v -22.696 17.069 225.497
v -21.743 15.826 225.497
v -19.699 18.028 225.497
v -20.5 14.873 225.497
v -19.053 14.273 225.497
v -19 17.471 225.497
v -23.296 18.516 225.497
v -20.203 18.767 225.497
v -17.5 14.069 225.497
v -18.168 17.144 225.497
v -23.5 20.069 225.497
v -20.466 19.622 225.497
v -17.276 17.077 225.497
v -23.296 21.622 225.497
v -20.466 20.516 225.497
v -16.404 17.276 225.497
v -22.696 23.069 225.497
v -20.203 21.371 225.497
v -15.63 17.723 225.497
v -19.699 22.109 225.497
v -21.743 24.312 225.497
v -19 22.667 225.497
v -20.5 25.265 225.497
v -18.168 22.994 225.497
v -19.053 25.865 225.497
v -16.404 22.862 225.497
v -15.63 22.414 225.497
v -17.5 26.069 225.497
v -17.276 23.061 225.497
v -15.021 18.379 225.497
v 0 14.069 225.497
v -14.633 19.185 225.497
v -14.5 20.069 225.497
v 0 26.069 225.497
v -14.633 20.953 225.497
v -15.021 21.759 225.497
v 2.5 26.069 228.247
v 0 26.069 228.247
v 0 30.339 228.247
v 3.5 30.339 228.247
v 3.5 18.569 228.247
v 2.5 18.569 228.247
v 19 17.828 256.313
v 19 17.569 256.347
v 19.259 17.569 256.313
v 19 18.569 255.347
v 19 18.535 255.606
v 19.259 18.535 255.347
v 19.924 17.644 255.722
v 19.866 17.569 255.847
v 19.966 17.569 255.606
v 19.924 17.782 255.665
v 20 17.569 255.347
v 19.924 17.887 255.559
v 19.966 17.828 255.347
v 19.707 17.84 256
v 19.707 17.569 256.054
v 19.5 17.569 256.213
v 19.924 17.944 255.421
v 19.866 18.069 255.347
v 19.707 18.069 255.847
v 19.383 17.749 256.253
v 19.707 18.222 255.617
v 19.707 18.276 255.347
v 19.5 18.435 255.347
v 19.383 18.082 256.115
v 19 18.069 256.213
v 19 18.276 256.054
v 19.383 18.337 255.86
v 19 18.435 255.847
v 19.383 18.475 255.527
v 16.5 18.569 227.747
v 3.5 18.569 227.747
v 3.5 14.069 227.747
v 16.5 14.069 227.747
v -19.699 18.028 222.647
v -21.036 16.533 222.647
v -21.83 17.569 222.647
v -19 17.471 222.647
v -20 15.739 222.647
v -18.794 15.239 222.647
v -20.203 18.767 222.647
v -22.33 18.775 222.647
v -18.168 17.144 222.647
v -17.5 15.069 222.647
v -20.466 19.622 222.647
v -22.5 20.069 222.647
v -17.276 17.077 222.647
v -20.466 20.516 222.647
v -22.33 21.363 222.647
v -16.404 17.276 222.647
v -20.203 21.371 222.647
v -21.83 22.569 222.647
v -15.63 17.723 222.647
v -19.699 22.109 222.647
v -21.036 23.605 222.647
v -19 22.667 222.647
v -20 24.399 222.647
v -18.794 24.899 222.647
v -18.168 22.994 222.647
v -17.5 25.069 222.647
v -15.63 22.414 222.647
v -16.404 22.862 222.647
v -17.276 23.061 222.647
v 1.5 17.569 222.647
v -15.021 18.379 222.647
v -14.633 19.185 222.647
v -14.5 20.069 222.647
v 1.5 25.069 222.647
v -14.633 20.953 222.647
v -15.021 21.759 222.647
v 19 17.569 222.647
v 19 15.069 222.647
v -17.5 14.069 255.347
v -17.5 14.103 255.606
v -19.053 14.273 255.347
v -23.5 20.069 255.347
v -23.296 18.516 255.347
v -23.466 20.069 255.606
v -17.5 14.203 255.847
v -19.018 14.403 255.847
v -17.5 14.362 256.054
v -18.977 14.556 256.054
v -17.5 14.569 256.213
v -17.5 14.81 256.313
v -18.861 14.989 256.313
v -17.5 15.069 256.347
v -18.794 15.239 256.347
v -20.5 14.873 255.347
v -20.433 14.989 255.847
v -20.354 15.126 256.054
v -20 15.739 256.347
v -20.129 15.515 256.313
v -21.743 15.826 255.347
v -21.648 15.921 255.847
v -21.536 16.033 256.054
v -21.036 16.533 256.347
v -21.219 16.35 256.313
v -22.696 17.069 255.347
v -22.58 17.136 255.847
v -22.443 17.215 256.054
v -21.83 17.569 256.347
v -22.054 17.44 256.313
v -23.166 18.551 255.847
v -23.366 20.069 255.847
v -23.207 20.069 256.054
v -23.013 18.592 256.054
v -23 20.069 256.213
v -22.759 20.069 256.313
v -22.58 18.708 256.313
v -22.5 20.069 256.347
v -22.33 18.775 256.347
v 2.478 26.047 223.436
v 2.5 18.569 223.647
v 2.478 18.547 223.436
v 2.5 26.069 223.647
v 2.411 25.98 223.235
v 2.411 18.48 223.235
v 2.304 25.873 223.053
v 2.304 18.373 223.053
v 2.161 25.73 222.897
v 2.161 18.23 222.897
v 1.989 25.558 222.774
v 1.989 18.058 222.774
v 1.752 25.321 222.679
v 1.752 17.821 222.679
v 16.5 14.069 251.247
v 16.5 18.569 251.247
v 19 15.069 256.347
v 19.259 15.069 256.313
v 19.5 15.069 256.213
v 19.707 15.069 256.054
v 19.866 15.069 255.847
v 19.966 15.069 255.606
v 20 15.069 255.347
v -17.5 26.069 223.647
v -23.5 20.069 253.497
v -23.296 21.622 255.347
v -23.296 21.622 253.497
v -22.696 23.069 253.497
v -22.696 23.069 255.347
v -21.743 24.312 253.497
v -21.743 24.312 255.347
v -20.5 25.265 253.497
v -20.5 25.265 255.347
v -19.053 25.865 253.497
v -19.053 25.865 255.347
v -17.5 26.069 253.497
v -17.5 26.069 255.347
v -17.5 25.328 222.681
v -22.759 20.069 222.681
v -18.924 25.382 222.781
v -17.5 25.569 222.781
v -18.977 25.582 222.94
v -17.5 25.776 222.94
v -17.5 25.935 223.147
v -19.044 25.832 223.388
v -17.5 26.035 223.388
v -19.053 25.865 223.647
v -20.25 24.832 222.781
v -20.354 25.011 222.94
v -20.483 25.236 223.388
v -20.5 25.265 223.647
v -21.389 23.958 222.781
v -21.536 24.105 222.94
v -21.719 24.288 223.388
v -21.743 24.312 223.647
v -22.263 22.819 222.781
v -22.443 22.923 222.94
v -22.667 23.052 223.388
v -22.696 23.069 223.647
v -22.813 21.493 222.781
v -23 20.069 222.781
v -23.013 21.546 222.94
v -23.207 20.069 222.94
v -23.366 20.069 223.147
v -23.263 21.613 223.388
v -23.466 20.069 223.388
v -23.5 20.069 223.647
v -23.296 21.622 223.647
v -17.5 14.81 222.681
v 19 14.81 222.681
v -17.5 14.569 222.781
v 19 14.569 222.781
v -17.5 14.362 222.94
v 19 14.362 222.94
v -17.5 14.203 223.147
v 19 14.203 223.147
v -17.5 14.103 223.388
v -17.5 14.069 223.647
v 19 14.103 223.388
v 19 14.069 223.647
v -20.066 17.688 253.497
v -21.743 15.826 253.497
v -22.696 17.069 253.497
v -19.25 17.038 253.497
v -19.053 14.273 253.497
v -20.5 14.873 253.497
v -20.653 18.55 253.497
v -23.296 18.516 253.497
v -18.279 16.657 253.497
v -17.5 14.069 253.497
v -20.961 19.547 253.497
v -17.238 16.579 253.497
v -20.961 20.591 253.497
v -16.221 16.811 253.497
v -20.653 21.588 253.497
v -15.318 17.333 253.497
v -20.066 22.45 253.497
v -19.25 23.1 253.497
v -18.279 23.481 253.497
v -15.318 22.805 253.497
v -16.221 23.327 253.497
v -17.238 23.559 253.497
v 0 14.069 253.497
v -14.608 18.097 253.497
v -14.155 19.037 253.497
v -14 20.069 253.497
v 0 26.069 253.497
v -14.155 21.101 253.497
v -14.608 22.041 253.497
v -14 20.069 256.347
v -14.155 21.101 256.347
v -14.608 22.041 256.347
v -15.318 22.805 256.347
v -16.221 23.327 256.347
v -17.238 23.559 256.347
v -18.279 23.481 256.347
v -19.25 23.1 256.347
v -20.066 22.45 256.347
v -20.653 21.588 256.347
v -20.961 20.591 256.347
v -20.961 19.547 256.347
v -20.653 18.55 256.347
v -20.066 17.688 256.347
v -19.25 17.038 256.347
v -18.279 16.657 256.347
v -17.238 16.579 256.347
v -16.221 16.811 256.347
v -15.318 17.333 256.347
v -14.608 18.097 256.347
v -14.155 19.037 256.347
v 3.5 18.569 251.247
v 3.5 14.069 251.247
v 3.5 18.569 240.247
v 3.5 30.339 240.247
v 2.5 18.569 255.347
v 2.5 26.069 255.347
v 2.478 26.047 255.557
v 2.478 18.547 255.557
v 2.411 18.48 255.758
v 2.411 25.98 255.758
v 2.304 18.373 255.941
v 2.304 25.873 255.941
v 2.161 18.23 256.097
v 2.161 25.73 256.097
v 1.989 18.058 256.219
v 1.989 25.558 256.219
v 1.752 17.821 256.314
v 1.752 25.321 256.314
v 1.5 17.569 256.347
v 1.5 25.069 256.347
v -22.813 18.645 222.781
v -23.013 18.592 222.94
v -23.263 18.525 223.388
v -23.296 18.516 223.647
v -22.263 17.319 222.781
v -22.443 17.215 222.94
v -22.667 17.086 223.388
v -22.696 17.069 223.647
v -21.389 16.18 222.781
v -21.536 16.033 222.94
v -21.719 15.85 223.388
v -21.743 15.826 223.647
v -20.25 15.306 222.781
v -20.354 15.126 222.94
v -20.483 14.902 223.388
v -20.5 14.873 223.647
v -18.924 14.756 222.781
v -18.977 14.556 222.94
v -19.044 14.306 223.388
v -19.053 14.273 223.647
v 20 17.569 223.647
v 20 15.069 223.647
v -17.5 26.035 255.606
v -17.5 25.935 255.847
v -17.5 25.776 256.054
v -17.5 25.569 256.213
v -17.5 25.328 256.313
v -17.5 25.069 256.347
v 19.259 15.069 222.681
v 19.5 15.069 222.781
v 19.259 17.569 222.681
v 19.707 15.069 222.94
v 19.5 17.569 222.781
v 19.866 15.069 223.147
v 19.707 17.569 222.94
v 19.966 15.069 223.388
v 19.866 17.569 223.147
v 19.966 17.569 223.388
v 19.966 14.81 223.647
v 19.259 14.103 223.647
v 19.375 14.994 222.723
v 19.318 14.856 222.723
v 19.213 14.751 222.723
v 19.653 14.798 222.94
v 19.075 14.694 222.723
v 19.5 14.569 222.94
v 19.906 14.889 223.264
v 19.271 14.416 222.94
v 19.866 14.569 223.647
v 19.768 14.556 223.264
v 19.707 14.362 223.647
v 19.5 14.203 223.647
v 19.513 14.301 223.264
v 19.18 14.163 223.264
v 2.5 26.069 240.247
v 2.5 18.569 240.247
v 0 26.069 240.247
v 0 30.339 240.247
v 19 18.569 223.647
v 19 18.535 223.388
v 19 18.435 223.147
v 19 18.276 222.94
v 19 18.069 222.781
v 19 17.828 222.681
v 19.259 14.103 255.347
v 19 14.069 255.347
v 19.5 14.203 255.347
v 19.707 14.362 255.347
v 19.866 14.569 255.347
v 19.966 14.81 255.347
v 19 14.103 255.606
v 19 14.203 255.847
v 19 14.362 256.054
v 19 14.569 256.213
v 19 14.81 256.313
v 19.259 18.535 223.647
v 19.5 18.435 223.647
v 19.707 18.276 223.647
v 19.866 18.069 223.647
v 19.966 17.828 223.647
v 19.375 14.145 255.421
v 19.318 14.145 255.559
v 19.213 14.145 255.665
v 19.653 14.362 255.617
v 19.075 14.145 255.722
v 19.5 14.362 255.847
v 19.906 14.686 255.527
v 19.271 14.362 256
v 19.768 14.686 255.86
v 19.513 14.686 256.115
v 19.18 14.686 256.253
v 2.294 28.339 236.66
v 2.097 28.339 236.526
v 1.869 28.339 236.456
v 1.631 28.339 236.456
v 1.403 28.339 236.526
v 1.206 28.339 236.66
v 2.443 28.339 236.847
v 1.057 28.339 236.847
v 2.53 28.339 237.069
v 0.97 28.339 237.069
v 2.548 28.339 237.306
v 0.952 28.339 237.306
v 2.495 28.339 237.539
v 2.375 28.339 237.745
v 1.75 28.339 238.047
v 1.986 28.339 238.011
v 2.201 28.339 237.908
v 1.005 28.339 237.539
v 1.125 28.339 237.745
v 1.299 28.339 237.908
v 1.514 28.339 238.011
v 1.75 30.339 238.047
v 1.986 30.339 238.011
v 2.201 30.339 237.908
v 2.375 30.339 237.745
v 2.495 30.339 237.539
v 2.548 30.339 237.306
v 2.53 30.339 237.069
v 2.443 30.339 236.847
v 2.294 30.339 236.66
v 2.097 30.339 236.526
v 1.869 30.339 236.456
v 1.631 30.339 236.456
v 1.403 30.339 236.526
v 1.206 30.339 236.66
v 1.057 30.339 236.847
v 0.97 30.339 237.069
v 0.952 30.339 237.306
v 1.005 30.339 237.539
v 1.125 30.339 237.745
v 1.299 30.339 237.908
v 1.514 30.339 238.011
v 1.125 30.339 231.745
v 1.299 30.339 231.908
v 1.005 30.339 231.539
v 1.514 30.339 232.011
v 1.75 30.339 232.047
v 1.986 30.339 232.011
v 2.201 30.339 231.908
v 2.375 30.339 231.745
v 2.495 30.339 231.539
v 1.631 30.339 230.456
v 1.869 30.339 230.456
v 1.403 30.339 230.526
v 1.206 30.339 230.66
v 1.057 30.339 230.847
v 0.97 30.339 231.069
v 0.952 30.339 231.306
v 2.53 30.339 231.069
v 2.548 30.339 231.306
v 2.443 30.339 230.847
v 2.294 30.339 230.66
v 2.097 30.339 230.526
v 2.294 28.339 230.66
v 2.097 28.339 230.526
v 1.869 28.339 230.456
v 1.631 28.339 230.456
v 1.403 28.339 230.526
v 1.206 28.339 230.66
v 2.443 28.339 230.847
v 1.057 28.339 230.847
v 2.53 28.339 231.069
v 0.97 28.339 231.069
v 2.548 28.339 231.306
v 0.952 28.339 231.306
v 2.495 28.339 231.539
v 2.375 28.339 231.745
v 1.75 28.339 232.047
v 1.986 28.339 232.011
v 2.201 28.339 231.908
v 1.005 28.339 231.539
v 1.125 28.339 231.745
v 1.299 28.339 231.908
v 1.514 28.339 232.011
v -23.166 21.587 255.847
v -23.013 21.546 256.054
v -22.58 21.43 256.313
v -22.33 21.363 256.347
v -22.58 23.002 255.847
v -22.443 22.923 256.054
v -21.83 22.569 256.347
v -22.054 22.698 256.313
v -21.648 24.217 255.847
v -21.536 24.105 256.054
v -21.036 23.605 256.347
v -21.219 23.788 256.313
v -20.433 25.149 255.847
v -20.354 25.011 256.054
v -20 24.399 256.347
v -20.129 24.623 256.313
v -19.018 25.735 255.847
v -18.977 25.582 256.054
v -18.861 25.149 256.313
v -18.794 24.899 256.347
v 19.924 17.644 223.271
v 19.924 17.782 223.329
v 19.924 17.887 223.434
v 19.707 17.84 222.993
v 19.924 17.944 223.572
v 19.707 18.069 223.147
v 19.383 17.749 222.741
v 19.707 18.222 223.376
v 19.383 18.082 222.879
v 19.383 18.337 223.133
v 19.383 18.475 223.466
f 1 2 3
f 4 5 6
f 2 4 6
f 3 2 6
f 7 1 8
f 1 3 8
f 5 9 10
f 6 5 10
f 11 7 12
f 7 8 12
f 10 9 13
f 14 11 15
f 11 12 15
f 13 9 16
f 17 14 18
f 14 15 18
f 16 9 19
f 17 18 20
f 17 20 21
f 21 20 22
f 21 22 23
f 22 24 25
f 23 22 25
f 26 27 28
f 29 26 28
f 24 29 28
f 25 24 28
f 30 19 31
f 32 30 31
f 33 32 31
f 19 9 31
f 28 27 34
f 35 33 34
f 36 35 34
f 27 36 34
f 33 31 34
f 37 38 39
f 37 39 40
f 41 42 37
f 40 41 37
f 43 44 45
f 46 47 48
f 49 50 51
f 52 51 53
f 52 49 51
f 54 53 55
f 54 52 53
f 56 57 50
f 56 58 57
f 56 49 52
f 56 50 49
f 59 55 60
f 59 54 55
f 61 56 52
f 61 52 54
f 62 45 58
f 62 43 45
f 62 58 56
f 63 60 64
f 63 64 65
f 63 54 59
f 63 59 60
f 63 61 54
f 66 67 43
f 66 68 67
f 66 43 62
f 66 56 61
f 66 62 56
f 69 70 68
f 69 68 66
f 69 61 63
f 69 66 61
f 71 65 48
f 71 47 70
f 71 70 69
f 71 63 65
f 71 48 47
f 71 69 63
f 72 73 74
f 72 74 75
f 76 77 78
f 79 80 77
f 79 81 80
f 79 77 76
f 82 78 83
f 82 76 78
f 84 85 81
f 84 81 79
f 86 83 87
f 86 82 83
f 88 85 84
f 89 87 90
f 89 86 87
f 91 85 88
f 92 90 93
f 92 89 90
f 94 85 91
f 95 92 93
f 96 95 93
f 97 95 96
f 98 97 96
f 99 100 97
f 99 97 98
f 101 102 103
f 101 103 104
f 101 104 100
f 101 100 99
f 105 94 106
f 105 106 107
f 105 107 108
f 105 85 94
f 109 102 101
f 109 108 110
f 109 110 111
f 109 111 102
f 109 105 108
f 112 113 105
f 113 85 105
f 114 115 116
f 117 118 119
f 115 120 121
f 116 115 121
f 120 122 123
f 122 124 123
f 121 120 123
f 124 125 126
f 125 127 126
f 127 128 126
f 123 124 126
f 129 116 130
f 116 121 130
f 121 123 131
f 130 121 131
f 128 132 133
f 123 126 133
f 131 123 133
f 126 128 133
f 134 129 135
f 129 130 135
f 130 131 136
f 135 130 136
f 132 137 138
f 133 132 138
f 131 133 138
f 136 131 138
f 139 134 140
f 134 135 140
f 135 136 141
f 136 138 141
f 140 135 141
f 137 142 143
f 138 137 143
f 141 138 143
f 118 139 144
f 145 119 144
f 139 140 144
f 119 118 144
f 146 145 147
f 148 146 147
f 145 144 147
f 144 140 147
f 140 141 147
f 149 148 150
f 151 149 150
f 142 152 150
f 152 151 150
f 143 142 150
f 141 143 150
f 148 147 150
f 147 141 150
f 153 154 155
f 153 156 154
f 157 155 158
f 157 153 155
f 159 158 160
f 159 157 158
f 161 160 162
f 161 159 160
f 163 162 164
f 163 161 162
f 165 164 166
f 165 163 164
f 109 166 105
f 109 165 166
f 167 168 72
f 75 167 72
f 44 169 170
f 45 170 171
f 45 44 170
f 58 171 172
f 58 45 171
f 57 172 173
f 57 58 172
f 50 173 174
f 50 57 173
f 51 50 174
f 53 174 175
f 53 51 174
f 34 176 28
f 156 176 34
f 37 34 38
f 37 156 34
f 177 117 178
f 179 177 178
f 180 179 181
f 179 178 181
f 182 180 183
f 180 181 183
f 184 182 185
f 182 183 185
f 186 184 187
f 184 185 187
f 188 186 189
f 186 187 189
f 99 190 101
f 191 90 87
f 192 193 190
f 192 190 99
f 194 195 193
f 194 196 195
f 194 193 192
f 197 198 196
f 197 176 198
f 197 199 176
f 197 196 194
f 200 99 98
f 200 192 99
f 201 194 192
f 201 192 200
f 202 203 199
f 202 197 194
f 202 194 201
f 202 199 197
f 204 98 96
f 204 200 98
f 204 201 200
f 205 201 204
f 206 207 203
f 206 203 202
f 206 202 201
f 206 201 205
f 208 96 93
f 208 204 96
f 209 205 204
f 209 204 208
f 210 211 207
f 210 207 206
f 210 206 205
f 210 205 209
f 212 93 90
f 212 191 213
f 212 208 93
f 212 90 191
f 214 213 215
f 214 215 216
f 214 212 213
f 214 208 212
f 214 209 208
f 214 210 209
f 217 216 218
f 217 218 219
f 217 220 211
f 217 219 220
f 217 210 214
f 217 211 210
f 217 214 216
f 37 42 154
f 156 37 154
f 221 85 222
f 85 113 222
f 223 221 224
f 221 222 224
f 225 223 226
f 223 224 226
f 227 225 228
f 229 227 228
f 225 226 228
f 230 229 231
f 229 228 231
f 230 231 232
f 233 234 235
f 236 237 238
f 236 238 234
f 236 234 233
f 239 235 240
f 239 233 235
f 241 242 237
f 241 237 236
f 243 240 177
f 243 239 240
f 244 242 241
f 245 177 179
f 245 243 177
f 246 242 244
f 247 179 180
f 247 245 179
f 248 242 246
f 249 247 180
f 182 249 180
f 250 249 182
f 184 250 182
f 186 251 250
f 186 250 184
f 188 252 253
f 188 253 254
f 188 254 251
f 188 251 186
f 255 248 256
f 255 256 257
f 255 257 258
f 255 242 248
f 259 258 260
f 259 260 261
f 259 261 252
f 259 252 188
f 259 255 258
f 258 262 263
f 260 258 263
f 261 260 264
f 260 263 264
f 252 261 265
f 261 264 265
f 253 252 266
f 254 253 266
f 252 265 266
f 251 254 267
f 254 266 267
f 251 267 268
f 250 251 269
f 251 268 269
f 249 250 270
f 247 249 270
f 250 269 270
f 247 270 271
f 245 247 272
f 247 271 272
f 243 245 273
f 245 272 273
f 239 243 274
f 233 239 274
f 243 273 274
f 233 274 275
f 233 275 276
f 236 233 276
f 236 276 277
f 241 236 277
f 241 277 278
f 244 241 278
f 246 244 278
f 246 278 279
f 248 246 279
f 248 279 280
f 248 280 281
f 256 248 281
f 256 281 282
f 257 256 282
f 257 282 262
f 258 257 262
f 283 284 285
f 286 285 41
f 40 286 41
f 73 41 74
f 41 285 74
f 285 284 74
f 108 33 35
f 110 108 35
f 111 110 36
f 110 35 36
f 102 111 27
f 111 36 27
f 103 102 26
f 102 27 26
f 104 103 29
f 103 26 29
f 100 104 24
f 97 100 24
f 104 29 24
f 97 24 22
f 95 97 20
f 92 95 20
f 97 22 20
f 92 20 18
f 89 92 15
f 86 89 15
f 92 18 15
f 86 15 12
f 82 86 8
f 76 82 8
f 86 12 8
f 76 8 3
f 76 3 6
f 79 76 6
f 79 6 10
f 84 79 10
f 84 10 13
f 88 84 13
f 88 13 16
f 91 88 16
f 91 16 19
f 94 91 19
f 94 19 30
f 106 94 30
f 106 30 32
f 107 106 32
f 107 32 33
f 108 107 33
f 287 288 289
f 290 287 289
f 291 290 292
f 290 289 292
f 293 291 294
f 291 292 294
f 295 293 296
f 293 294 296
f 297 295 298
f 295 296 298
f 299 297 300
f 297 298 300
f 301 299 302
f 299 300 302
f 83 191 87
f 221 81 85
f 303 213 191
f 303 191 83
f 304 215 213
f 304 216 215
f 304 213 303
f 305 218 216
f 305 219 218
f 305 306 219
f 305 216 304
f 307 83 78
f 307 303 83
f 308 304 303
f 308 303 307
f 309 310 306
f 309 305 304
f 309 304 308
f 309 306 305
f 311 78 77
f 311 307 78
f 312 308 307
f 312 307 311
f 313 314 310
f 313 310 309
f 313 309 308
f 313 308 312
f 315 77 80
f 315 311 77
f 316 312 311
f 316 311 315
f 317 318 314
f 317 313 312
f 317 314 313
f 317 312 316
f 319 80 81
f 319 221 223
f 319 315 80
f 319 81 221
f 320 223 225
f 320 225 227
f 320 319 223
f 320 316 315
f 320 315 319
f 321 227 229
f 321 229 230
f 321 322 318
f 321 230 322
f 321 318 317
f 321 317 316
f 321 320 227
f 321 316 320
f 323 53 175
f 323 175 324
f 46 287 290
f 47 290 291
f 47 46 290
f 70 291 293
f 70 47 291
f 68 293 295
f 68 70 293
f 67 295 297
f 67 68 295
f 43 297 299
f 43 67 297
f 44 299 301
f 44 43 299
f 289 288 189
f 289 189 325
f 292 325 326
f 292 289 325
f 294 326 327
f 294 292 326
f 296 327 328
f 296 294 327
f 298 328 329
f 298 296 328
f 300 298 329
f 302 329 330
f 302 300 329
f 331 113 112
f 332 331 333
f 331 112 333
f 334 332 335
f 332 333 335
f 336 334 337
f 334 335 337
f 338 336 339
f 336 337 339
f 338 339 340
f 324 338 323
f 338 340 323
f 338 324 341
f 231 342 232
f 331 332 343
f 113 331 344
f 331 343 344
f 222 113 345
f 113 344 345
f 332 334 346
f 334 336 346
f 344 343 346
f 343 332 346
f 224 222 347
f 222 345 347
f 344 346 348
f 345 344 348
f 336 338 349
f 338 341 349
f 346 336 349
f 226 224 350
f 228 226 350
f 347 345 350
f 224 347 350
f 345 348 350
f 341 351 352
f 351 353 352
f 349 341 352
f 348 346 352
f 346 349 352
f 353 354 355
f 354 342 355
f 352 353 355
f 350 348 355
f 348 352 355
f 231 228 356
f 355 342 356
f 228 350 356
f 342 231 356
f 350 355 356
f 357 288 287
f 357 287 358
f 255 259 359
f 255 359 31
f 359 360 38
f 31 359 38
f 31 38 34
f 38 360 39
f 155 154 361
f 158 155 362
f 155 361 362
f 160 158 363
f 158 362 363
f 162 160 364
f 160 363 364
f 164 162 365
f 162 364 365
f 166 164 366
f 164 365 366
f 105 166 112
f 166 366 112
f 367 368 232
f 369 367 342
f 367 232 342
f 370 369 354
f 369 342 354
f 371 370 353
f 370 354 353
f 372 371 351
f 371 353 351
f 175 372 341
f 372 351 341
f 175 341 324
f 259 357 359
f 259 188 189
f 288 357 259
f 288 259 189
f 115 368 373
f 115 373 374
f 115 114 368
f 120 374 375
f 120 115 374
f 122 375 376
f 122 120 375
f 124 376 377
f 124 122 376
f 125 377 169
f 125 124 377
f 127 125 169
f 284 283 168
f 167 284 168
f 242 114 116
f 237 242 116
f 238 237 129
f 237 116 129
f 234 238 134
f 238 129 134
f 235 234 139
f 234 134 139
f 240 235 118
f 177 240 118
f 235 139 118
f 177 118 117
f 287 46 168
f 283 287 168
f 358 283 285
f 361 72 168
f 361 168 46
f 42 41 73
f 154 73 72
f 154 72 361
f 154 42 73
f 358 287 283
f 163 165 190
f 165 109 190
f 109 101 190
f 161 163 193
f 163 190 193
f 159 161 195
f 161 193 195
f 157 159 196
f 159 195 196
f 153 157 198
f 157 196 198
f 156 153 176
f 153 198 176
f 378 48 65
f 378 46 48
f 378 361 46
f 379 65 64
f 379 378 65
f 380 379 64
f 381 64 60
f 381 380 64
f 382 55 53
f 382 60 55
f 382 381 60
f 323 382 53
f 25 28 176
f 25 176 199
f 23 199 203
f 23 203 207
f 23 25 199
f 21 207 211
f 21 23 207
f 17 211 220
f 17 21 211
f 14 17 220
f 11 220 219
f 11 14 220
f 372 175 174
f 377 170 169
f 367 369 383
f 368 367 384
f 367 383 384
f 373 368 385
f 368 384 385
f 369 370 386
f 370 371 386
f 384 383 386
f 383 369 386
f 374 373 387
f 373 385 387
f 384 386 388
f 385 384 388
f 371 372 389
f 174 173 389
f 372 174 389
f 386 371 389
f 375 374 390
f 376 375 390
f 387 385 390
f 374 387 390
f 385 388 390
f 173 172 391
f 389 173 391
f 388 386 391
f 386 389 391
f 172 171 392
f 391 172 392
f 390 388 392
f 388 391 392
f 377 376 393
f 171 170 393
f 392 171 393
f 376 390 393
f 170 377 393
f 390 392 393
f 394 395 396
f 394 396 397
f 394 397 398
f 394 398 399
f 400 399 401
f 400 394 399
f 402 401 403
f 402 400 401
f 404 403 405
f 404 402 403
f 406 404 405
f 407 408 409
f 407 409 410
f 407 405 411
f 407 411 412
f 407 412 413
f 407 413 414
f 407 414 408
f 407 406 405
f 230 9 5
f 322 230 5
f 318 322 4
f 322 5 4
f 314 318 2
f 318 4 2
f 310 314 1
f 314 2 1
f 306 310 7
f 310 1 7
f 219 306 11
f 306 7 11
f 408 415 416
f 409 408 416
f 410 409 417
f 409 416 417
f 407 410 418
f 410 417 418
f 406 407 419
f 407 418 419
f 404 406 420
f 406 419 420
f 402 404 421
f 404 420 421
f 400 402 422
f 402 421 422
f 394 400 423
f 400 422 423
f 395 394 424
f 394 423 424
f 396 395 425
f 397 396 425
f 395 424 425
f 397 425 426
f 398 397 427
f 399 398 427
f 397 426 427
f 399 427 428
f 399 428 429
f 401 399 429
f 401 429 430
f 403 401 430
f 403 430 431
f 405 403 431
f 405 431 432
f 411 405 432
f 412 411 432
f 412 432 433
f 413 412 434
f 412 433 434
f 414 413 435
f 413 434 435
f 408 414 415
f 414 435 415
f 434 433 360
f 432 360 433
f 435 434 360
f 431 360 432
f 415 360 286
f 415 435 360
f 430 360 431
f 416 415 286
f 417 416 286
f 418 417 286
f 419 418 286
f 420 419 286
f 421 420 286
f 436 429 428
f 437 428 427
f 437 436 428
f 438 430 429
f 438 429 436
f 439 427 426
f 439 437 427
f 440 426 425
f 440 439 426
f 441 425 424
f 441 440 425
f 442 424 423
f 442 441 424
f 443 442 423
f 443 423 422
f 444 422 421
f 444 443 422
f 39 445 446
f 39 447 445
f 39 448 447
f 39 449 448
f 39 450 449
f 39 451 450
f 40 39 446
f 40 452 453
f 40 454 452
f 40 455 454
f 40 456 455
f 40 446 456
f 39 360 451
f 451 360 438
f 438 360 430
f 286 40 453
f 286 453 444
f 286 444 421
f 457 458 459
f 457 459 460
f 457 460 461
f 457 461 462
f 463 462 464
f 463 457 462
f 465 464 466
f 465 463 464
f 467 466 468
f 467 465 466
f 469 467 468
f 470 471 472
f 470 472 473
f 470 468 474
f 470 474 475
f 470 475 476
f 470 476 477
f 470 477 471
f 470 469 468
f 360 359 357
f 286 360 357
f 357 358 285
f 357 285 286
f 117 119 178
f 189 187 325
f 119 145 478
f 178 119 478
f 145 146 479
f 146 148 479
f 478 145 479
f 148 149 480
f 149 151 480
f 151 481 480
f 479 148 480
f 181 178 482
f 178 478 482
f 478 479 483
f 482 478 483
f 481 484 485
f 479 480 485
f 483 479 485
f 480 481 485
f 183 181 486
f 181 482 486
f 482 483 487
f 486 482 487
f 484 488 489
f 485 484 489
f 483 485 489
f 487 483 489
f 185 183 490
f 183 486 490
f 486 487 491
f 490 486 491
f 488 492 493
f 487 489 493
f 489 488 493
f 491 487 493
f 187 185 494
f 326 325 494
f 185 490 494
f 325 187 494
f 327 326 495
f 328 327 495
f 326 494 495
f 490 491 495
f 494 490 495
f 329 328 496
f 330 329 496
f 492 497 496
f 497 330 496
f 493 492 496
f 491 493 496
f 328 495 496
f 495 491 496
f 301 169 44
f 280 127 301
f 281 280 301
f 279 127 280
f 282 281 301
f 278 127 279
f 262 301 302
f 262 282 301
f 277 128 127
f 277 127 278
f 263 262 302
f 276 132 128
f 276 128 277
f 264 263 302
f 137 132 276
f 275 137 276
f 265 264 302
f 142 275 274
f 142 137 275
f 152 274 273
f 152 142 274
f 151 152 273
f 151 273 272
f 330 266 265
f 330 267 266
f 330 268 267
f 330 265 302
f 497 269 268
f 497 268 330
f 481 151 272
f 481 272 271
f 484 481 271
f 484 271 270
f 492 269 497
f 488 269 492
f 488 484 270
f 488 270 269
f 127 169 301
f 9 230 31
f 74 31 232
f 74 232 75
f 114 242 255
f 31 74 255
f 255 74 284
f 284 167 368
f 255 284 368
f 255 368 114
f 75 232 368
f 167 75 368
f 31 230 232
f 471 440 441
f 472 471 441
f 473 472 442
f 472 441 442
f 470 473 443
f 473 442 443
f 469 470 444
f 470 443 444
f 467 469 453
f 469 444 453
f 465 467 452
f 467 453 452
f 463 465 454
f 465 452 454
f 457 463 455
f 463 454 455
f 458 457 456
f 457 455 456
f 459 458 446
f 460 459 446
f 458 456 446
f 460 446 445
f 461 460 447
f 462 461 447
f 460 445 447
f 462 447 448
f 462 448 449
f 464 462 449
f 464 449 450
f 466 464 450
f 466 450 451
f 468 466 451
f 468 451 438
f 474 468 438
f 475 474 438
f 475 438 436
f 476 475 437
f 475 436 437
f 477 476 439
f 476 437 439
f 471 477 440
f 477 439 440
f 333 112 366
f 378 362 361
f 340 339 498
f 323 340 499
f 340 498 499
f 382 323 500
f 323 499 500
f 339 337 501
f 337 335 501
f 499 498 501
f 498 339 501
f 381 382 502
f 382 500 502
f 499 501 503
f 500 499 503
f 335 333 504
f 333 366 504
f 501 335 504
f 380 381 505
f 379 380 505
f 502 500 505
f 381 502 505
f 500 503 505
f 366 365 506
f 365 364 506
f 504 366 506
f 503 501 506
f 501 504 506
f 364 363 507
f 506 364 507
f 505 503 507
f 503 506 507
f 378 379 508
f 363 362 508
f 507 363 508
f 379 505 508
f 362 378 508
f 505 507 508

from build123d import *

# Parameters (mm, degrees)
SKETCH1_W           = 33.7
SKETCH1_H           = 12
BOSS_EXTRUDE1_DEPTH = 2.5
SKETCH2_W           = 33.7
SKETCH2_H           = 4.5
BOSS_EXTRUDE2_DEPTH = 17.5
SKETCH3_W           = 13
SKETCH3_H           = 23.5
CUT_EXTRUDE1_DEPTH  = 258.235074474
SKETCH4_W           = 2.85
SKETCH4_H           = 12
BOSS_EXTRUDE3_DEPTH = 23.5
FILLET1_R           = 6
SKETCH5_R           = 3.5
CUT_EXTRUDE2_DEPTH  = 4
SKETCH6_R           = 3
CUT_EXTRUDE3_DEPTH  = 4
SKETCH7_W           = 3.5
SKETCH7_H           = 12
BOSS_EXTRUDE4_DEPTH = 11.77
FILLET2_R           = 1
SKETCH8_R           = 0.8
CUT_EXTRUDE4_DEPTH  = 2


with BuildPart() as part:
    # Sketch1 → Boss-Extrude1 (new body)
    with BuildSketch(Plane(origin=(0, 0, 0), x_dir=(0, 0, -1), z_dir=(1, 0, 0))):
        with Locations((-239.496705732, 20.068965517)):
            Rectangle(SKETCH1_W, SKETCH1_H)
    extrude(amount=BOSS_EXTRUDE1_DEPTH)

    # Sketch2 → Boss-Extrude2 (add)
    with BuildSketch(Plane(origin=(2.5, 0, 0), x_dir=(0, 0, -1), z_dir=(1, 0, 0))):
        with Locations((-239.496705732, 16.318965517)):
            Rectangle(SKETCH2_W, SKETCH2_H)
    extrude(amount=BOSS_EXTRUDE2_DEPTH)

    # Sketch3 → Cut-Extrude1 (cut, through all)
    with BuildSketch(Plane(origin=(0, 18.568965517, 0), x_dir=(1, 0, 0), z_dir=(0, 1, 0))):
        with Locations((10, -239.496705732)):
            Rectangle(SKETCH3_W, SKETCH3_H)
    extrude(amount=-CUT_EXTRUDE1_DEPTH, mode=Mode.SUBTRACT)

    # Sketch4 → Boss-Extrude3 (add)
    with BuildSketch(Plane.ZY):
        with Locations((224.071705732, 20.068965517)):
            Rectangle(SKETCH4_W, SKETCH4_H)
        with Locations((254.921705732, 20.068965517)):
            Rectangle(SKETCH4_W, SKETCH4_H)
    extrude(amount=BOSS_EXTRUDE3_DEPTH)

    # Fillet1
    fillet1_edges = [part.edges().sort_by_distance(p)[0] for p in [
        (-23.5, 14.068965517, 224.071705732),
        (-23.5, 26.068965517, 224.071705732),
        (-23.5, 14.068965517, 254.921705732),
        (-23.5, 26.068965517, 254.921705732),
    ]]
    fillet(fillet1_edges, radius=FILLET1_R - 0.0001)  # a hair under: the kernel refuses the full size

    # Sketch5 → Cut-Extrude2 (cut)
    with BuildSketch(Plane.XY.offset(256.346705732)):
        with Locations((-17.5, 20.068965517)):
            Circle(SKETCH5_R)
    extrude(amount=-CUT_EXTRUDE2_DEPTH, mode=Mode.SUBTRACT)

    # Sketch6 → Cut-Extrude3 (cut)
    with BuildSketch(Plane.XY.offset(225.496705732)):
        with Locations((-17.5, 20.068965517)):
            Circle(SKETCH6_R)
    extrude(amount=-CUT_EXTRUDE3_DEPTH, mode=Mode.SUBTRACT)

    # Sketch7 → Boss-Extrude4 (add)
    with BuildSketch(Plane(origin=(0, 18.568965517, 0), x_dir=(1, 0, 0), z_dir=(0, 1, 0))):
        with Locations((1.75, -234.246705732)):
            Rectangle(SKETCH7_W, SKETCH7_H)
    extrude(amount=BOSS_EXTRUDE4_DEPTH)

    # Fillet2
    fillet2_edges = [part.edges().sort_by_distance(p)[0] for p in [
        (2.5, 22.318965517, 222.646705732),
        (11.25, 18.568965517, 256.346705732),
        (11.25, 18.568965517, 222.646705732),
        (20, 16.318965517, 256.346705732),
        (20, 14.068965517, 239.496705732),
        (20, 16.318965517, 222.646705732),
        (20, 18.568965517, 239.496705732),
        (2.5, 22.318965517, 256.346705732),
        (-21.742669976, 24.311635494, 222.646705732),
        (-21.742669976, 15.826295541, 222.646705732),
        (-21.742669976, 24.311635494, 256.346705732),
        (-21.742669976, 15.826295541, 256.346705732),
        (-7.50005, 26.068965517, 256.346705732),
        (-7.50005, 26.068965517, 222.646705732),
        (1.24995, 14.068965517, 222.646705732),
        (1.24995, 14.068965517, 256.346705732),
    ]]
    fillet(fillet2_edges, radius=FILLET2_R)

    # Sketch8 → Cut-Extrude4 (cut)
    with BuildSketch(Plane(origin=(0, 30.338965517, 0), x_dir=(1, 0, 0), z_dir=(0, 1, 0))):
        with Locations(Location((1.75, -231.246705732, 0), (0, 0, 270))):
            Circle(SKETCH8_R)
        with Locations(Location((1.75, -237.246705732, 0), (0, 0, 270))):
            Circle(SKETCH8_R)
    extrude(amount=-CUT_EXTRUDE4_DEPTH, mode=Mode.SUBTRACT)


solid = part.part
